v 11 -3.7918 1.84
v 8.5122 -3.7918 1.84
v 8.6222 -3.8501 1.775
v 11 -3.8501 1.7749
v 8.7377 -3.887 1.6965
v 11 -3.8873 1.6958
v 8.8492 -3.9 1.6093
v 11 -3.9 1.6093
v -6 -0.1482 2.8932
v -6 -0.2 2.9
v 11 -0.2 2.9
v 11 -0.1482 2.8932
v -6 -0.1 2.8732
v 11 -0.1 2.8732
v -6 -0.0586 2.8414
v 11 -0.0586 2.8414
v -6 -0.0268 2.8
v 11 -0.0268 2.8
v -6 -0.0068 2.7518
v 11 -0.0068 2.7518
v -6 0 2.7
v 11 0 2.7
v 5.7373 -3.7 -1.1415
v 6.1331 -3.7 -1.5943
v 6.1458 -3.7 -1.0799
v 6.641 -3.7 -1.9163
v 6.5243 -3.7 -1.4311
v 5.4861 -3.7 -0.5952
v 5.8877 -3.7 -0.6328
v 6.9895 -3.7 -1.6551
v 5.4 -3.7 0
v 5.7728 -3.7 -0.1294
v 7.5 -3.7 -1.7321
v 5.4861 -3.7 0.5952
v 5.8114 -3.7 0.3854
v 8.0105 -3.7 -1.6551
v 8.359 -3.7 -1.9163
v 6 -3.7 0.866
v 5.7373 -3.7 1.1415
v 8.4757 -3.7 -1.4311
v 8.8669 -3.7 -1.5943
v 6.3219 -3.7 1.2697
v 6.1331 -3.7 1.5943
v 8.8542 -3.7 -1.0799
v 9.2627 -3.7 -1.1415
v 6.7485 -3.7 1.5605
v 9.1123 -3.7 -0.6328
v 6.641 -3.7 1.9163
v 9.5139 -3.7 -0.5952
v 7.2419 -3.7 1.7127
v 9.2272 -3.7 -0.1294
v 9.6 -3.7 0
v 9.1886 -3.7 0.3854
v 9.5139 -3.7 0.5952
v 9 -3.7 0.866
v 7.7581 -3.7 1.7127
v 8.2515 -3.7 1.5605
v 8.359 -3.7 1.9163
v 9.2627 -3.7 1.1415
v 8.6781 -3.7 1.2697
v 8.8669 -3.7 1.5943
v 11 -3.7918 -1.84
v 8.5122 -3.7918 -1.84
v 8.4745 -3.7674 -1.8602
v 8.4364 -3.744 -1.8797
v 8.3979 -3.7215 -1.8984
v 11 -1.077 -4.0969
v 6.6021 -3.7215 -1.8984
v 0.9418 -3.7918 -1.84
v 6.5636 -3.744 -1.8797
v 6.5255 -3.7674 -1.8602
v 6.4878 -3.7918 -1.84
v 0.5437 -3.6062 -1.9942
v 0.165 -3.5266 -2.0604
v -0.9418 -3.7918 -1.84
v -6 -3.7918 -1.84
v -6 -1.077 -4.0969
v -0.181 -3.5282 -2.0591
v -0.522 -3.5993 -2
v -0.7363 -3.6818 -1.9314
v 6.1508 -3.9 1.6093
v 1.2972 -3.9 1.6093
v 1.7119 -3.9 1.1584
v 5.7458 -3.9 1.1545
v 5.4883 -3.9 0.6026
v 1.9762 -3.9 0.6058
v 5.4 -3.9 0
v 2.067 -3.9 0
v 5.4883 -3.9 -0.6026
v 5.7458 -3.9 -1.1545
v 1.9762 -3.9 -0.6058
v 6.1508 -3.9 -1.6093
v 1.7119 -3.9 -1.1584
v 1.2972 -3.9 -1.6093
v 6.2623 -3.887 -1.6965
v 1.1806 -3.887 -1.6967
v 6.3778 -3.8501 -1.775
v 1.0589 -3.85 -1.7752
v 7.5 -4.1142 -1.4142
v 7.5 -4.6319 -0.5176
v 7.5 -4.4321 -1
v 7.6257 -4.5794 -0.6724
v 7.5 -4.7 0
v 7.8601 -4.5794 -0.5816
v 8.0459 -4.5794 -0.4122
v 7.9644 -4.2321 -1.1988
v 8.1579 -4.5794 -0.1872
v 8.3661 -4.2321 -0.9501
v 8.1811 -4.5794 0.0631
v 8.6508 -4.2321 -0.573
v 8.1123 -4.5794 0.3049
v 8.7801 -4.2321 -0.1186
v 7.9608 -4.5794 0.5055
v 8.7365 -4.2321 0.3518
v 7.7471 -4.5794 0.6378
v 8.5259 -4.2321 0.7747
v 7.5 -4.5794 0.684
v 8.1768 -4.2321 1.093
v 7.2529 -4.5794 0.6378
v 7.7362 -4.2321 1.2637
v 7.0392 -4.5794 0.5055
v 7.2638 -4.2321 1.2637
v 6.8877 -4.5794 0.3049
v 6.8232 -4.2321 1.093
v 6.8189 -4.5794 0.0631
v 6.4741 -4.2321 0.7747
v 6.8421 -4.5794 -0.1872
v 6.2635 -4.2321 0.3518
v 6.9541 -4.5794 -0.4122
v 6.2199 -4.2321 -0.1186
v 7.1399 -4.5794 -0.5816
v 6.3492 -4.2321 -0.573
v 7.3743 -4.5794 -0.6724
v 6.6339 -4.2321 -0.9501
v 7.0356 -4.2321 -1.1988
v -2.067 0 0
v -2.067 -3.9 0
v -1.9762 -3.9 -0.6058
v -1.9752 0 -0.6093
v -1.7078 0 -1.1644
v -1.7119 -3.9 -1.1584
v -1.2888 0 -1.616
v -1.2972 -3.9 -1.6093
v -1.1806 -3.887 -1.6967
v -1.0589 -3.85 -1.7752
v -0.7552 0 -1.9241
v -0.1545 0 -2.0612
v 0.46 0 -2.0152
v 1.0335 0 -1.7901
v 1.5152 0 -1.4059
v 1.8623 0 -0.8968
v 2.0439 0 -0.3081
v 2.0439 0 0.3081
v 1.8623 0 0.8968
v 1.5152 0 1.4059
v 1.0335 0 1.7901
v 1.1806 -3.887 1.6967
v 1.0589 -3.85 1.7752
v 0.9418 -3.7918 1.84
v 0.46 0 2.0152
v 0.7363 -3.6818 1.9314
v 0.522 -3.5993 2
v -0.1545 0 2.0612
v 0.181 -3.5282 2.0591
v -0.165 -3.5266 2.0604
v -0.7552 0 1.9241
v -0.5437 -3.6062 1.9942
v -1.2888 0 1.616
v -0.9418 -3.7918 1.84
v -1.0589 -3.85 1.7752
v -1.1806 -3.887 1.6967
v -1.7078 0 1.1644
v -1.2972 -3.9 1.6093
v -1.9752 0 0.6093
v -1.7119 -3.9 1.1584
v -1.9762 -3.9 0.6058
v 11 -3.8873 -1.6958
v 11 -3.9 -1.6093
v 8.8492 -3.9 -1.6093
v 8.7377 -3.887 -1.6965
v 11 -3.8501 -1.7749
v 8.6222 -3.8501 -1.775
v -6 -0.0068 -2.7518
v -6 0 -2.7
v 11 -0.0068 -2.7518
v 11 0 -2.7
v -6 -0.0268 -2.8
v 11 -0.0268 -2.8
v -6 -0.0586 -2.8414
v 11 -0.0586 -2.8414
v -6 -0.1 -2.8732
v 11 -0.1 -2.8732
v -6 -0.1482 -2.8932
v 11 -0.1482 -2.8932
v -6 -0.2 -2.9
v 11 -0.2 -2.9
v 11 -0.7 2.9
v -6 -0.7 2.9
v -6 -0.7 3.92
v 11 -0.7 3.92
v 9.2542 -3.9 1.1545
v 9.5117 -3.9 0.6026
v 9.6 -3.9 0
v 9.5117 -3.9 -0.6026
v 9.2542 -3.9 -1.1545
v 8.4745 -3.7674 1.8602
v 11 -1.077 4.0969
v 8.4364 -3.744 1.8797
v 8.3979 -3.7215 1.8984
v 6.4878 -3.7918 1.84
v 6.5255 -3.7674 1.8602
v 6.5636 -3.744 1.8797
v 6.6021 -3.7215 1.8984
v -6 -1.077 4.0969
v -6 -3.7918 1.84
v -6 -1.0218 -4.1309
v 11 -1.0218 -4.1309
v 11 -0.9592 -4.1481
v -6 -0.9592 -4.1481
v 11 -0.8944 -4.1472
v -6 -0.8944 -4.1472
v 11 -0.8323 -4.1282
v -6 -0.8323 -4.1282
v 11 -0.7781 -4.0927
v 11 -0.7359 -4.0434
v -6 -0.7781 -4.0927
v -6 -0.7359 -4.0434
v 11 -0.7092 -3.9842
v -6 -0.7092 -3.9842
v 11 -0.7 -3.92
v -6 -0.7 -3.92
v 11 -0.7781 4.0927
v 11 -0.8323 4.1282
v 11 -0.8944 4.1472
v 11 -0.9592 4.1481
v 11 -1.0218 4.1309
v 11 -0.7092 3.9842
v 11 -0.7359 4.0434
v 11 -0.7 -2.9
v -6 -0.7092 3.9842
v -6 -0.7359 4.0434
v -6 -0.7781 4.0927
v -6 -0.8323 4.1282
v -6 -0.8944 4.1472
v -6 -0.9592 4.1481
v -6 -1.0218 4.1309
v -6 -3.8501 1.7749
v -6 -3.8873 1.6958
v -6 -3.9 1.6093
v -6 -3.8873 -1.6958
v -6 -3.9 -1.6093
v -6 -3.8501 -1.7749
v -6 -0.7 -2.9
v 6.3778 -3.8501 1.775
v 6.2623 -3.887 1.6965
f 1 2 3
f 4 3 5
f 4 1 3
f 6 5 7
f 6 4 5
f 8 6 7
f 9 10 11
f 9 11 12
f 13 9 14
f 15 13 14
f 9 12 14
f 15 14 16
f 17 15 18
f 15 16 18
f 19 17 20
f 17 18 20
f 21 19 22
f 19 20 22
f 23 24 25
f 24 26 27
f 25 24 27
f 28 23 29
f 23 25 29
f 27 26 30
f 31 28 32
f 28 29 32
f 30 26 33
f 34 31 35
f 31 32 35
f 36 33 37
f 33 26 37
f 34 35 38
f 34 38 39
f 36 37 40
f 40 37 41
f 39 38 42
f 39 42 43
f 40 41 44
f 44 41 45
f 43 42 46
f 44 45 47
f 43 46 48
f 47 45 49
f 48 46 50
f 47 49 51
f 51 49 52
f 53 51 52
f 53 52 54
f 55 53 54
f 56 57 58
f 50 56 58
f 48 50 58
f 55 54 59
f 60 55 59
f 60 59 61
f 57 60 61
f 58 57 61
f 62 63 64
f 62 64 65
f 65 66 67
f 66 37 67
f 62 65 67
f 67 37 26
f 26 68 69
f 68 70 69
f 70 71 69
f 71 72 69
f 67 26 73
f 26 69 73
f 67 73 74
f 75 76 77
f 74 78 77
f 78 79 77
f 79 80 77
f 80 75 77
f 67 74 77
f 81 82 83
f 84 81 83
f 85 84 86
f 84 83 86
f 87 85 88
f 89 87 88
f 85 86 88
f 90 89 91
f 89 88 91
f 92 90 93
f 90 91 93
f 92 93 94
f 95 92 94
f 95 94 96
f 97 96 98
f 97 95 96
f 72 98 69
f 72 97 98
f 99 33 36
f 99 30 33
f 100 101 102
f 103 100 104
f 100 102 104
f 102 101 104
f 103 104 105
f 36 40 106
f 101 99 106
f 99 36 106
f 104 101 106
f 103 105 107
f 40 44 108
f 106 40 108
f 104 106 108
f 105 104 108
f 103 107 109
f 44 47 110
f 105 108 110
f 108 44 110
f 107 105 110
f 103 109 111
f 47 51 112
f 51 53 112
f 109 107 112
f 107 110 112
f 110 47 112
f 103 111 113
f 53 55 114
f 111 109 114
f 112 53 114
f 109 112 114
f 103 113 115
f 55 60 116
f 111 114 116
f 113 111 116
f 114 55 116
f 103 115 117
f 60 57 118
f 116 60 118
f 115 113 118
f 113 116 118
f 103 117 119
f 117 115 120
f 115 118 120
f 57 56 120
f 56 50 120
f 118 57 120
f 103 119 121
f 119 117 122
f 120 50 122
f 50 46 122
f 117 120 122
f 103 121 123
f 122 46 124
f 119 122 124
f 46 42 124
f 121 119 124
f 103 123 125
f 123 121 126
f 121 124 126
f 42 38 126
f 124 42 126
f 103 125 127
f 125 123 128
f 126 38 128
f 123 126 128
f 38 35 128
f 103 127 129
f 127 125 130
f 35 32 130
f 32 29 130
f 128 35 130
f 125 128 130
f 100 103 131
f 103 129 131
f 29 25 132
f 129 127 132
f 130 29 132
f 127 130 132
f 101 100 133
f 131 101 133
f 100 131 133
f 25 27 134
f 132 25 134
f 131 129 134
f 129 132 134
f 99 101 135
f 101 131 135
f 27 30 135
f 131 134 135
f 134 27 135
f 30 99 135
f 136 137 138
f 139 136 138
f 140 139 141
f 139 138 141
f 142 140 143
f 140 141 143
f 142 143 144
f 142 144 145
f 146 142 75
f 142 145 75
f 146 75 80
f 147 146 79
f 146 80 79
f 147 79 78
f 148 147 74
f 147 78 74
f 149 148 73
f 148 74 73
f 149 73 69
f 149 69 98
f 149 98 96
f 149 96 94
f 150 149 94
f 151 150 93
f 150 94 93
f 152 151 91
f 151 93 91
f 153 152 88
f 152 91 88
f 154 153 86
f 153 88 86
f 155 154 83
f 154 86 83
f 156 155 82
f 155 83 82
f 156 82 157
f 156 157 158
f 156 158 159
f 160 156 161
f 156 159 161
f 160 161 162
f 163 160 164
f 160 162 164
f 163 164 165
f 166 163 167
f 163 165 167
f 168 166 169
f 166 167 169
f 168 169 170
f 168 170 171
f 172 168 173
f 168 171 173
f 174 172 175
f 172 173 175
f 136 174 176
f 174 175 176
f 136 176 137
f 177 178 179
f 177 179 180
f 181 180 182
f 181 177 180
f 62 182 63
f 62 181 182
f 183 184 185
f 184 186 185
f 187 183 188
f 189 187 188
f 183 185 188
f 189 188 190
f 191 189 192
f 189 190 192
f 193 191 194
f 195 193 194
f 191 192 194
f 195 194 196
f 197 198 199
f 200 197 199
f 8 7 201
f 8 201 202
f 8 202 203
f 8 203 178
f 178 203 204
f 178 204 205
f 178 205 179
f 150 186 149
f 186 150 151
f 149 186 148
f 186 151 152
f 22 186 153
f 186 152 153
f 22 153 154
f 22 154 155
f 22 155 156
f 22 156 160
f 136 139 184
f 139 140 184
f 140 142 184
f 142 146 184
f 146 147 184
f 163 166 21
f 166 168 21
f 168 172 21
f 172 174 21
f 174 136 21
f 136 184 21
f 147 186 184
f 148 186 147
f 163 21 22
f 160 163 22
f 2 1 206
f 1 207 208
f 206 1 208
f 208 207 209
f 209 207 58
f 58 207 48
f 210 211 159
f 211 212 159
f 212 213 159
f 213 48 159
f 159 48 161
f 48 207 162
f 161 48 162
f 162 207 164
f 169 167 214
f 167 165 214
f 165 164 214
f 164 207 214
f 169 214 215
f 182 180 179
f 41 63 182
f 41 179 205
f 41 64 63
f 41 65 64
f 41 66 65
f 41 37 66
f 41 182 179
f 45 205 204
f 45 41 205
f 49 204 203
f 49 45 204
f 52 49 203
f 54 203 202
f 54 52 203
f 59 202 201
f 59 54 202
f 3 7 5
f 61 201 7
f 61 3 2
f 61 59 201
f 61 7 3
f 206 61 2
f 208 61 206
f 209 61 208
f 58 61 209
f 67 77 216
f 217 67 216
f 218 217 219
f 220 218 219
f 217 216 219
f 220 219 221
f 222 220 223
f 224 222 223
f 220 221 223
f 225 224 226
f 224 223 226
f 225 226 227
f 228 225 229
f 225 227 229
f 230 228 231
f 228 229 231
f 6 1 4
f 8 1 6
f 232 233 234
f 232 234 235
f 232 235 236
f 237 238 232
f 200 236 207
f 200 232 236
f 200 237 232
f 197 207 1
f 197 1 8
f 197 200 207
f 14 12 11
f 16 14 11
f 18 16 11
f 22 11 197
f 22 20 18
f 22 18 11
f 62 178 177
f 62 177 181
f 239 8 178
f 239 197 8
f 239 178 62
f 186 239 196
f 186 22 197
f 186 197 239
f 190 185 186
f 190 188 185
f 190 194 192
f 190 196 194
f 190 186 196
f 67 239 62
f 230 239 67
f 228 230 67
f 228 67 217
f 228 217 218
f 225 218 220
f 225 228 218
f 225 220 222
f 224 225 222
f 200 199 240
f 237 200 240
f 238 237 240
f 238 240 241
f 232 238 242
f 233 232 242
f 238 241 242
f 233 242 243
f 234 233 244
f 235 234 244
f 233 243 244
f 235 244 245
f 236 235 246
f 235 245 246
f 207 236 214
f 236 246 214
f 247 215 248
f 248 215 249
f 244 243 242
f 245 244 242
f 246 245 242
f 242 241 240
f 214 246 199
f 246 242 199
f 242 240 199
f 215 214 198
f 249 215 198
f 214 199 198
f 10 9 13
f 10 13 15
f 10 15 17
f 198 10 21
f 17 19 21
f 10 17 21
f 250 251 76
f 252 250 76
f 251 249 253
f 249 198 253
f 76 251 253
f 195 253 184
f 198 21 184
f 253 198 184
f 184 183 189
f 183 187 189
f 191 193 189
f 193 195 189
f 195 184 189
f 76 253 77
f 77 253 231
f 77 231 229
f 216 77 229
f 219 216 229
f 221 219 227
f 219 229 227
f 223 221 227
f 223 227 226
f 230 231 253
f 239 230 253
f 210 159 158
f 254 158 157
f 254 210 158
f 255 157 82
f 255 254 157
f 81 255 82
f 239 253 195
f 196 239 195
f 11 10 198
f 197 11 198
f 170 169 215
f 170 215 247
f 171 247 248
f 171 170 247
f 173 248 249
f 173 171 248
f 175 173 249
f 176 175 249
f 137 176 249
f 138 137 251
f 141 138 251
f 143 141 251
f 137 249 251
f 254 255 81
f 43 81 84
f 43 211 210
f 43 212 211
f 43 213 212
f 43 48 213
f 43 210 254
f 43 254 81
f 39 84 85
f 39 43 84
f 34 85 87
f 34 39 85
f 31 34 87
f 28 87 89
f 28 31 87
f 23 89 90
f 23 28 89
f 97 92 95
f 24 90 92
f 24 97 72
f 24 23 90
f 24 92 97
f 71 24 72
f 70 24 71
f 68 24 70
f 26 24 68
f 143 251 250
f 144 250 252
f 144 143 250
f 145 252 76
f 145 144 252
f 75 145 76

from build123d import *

# Parameters (mm, degrees)
BOSS_EXTRUDE1_DEPTH = 17
FILLET1_R           = 0.3
FILLET2_R           = 0.2
SKETCH2_W           = 2.1
SKETCH2_H           = 0.2
TAPPED_HOLE1_D      = 4.134


with BuildPart() as part:
    # Sketch1 → Boss-Extrude1 (new body)
    with BuildSketch(Plane(origin=(-6, 0, 0), x_dir=(0, 0, -1), z_dir=(1, 0, 0))):
        with BuildLine():
            Line((2.9, 0), (-2.9, 0))
            Line((-2.9, 0), (-2.9, -0.7))
            Line((-2.9, -0.7), (-3.92, -0.7))
            ThreePointArc((-3.92, -0.7), (-4.128228295, -0.832322075), (-4.096863547, -1.077034982))
            Line((-4.096863547, -1.077034982), (-1.75, -3.9))
            Line((-1.75, -3.9), (1.75, -3.9))
            Line((1.75, -3.9), (4.096863547, -1.077034982))
            ThreePointArc((4.096863547, -1.077034982), (4.128228295, -0.832322075), (3.92, -0.7))
            Line((3.92, -0.7), (2.9, -0.7))
            Line((2.9, -0.7), (2.9, 0))
        make_face()
    extrude(amount=BOSS_EXTRUDE1_DEPTH)

    # Fillet1
    fillet1_edges = [part.edges().sort_by_distance(p)[0] for p in [
        (2.5, -3.9, -1.75),
        (2.5, -3.9, 1.75),
    ]]
    fillet(fillet1_edges, radius=FILLET1_R)

    # Fillet2
    fillet2_edges = [part.edges().sort_by_distance(p)[0] for p in [
        (2.5, 0, 2.9),
        (2.5, 0, -2.9),
    ]]
    fillet(fillet2_edges, radius=FILLET2_R)

    # Sketch2 → Cut-Revolve1 (revolve, cut)
    with BuildSketch(Plane(origin=(7.5, 0, 0), x_dir=(0, 0, -1), z_dir=(1, 0, 0))):
        with Locations((1.05, -3.8)):
            Rectangle(SKETCH2_W, SKETCH2_H)
    revolve(axis=Axis((7.5, 1.665548573, 0), (0, -1, 0)), mode=Mode.SUBTRACT)

    # Sketch3 → Revolve1 (revolve)
    with BuildSketch(Plane(origin=(7.5, 0, 0), x_dir=(0, 0, -1), z_dir=(1, 0, 0))):
        with BuildLine():
            Line((1.732050808, -3.7), (0, -3.7))
            Line((0, -3.7), (0, -4.7))
            ThreePointArc((0, -4.7), (1, -4.432050808), (1.732050808, -3.7))
        make_face()
    revolve(axis=Axis((7.5, 0, 0), (0, -1, 0)))

    # Tapped Hole1 (through all)
    with Locations(Plane(origin=(0, 0, 0), x_dir=(1, 0, 0), z_dir=(0, 1, 0))):
        with Locations((0, 0)):
            Hole(TAPPED_HOLE1_D / 2)


solid = part.part
